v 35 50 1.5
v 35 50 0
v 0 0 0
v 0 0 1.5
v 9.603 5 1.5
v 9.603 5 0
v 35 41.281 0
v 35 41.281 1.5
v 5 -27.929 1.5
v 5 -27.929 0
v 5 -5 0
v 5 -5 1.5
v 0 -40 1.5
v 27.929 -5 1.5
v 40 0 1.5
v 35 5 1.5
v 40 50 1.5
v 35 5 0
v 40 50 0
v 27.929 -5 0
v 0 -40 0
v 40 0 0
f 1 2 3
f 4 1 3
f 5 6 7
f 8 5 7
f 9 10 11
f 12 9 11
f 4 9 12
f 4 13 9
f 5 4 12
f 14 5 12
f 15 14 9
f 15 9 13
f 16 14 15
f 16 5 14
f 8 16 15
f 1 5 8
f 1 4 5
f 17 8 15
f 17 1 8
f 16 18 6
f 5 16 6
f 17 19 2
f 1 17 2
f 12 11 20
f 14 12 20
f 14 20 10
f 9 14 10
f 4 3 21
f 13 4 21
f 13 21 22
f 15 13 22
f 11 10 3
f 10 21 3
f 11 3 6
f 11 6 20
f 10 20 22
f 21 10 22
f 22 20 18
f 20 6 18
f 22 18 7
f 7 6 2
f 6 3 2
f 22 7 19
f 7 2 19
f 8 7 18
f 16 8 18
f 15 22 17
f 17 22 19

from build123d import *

# Parameters (mm, degrees)
F1_DEPTH = 1.5


with BuildPart() as f1:
    # F0 (on Top) → F1 (new body)
    with BuildSketch(Plane.XY):
        Polygon((35, 50), (0, 0), (40, 0), (40, 50), align=None)
        Polygon((9.603278, 5), (35, 41.281032), (35, 5), align=None, mode=Mode.SUBTRACT)
        Polygon((40, 0), (0, 0), (0, -40), align=None)
        Polygon((5, -27.928932), (5, -5), (27.928932, -5), align=None, mode=Mode.SUBTRACT)
    extrude(amount=F1_DEPTH)


solid = f1.part
